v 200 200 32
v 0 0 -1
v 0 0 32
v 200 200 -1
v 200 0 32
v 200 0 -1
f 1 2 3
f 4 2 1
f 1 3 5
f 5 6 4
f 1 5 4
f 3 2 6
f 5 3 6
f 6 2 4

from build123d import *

# Parameters (mm, degrees)
BOX_W               = 313
BOX_H               = 200
BOX_DEPTH           = 37
BOX_PLACEMENT_ANGLE = 45
BOX008_W            = 200
BOX008_H            = 200
BOX008_DEPTH        = 33


with BuildPart() as cube002:
    # Box → Box (new body)
    with BuildSketch(Plane.XY):
        with Locations((156.5, 100)):
            Rectangle(BOX_W, BOX_H)
    extrude(amount=BOX_DEPTH)


with BuildPart() as cube002_1:
    # Box placement: moved
    add(cube002.part.moved(Location((0, 0, -2))).rotate(Axis((0, 0, -2), (0, 0, 1)), BOX_PLACEMENT_ANGLE))


with BuildPart() as long_45a:
    # Box008 → Box008 (new body)
    with BuildSketch(Plane.XY.offset(-1)):
        with Locations((100, 100)):
            Rectangle(BOX008_W, BOX008_H)
    extrude(amount=BOX008_DEPTH)

    # Cut006: cut Cube002
    add(cube002_1.part, mode=Mode.SUBTRACT)


solid = long_45a.part
